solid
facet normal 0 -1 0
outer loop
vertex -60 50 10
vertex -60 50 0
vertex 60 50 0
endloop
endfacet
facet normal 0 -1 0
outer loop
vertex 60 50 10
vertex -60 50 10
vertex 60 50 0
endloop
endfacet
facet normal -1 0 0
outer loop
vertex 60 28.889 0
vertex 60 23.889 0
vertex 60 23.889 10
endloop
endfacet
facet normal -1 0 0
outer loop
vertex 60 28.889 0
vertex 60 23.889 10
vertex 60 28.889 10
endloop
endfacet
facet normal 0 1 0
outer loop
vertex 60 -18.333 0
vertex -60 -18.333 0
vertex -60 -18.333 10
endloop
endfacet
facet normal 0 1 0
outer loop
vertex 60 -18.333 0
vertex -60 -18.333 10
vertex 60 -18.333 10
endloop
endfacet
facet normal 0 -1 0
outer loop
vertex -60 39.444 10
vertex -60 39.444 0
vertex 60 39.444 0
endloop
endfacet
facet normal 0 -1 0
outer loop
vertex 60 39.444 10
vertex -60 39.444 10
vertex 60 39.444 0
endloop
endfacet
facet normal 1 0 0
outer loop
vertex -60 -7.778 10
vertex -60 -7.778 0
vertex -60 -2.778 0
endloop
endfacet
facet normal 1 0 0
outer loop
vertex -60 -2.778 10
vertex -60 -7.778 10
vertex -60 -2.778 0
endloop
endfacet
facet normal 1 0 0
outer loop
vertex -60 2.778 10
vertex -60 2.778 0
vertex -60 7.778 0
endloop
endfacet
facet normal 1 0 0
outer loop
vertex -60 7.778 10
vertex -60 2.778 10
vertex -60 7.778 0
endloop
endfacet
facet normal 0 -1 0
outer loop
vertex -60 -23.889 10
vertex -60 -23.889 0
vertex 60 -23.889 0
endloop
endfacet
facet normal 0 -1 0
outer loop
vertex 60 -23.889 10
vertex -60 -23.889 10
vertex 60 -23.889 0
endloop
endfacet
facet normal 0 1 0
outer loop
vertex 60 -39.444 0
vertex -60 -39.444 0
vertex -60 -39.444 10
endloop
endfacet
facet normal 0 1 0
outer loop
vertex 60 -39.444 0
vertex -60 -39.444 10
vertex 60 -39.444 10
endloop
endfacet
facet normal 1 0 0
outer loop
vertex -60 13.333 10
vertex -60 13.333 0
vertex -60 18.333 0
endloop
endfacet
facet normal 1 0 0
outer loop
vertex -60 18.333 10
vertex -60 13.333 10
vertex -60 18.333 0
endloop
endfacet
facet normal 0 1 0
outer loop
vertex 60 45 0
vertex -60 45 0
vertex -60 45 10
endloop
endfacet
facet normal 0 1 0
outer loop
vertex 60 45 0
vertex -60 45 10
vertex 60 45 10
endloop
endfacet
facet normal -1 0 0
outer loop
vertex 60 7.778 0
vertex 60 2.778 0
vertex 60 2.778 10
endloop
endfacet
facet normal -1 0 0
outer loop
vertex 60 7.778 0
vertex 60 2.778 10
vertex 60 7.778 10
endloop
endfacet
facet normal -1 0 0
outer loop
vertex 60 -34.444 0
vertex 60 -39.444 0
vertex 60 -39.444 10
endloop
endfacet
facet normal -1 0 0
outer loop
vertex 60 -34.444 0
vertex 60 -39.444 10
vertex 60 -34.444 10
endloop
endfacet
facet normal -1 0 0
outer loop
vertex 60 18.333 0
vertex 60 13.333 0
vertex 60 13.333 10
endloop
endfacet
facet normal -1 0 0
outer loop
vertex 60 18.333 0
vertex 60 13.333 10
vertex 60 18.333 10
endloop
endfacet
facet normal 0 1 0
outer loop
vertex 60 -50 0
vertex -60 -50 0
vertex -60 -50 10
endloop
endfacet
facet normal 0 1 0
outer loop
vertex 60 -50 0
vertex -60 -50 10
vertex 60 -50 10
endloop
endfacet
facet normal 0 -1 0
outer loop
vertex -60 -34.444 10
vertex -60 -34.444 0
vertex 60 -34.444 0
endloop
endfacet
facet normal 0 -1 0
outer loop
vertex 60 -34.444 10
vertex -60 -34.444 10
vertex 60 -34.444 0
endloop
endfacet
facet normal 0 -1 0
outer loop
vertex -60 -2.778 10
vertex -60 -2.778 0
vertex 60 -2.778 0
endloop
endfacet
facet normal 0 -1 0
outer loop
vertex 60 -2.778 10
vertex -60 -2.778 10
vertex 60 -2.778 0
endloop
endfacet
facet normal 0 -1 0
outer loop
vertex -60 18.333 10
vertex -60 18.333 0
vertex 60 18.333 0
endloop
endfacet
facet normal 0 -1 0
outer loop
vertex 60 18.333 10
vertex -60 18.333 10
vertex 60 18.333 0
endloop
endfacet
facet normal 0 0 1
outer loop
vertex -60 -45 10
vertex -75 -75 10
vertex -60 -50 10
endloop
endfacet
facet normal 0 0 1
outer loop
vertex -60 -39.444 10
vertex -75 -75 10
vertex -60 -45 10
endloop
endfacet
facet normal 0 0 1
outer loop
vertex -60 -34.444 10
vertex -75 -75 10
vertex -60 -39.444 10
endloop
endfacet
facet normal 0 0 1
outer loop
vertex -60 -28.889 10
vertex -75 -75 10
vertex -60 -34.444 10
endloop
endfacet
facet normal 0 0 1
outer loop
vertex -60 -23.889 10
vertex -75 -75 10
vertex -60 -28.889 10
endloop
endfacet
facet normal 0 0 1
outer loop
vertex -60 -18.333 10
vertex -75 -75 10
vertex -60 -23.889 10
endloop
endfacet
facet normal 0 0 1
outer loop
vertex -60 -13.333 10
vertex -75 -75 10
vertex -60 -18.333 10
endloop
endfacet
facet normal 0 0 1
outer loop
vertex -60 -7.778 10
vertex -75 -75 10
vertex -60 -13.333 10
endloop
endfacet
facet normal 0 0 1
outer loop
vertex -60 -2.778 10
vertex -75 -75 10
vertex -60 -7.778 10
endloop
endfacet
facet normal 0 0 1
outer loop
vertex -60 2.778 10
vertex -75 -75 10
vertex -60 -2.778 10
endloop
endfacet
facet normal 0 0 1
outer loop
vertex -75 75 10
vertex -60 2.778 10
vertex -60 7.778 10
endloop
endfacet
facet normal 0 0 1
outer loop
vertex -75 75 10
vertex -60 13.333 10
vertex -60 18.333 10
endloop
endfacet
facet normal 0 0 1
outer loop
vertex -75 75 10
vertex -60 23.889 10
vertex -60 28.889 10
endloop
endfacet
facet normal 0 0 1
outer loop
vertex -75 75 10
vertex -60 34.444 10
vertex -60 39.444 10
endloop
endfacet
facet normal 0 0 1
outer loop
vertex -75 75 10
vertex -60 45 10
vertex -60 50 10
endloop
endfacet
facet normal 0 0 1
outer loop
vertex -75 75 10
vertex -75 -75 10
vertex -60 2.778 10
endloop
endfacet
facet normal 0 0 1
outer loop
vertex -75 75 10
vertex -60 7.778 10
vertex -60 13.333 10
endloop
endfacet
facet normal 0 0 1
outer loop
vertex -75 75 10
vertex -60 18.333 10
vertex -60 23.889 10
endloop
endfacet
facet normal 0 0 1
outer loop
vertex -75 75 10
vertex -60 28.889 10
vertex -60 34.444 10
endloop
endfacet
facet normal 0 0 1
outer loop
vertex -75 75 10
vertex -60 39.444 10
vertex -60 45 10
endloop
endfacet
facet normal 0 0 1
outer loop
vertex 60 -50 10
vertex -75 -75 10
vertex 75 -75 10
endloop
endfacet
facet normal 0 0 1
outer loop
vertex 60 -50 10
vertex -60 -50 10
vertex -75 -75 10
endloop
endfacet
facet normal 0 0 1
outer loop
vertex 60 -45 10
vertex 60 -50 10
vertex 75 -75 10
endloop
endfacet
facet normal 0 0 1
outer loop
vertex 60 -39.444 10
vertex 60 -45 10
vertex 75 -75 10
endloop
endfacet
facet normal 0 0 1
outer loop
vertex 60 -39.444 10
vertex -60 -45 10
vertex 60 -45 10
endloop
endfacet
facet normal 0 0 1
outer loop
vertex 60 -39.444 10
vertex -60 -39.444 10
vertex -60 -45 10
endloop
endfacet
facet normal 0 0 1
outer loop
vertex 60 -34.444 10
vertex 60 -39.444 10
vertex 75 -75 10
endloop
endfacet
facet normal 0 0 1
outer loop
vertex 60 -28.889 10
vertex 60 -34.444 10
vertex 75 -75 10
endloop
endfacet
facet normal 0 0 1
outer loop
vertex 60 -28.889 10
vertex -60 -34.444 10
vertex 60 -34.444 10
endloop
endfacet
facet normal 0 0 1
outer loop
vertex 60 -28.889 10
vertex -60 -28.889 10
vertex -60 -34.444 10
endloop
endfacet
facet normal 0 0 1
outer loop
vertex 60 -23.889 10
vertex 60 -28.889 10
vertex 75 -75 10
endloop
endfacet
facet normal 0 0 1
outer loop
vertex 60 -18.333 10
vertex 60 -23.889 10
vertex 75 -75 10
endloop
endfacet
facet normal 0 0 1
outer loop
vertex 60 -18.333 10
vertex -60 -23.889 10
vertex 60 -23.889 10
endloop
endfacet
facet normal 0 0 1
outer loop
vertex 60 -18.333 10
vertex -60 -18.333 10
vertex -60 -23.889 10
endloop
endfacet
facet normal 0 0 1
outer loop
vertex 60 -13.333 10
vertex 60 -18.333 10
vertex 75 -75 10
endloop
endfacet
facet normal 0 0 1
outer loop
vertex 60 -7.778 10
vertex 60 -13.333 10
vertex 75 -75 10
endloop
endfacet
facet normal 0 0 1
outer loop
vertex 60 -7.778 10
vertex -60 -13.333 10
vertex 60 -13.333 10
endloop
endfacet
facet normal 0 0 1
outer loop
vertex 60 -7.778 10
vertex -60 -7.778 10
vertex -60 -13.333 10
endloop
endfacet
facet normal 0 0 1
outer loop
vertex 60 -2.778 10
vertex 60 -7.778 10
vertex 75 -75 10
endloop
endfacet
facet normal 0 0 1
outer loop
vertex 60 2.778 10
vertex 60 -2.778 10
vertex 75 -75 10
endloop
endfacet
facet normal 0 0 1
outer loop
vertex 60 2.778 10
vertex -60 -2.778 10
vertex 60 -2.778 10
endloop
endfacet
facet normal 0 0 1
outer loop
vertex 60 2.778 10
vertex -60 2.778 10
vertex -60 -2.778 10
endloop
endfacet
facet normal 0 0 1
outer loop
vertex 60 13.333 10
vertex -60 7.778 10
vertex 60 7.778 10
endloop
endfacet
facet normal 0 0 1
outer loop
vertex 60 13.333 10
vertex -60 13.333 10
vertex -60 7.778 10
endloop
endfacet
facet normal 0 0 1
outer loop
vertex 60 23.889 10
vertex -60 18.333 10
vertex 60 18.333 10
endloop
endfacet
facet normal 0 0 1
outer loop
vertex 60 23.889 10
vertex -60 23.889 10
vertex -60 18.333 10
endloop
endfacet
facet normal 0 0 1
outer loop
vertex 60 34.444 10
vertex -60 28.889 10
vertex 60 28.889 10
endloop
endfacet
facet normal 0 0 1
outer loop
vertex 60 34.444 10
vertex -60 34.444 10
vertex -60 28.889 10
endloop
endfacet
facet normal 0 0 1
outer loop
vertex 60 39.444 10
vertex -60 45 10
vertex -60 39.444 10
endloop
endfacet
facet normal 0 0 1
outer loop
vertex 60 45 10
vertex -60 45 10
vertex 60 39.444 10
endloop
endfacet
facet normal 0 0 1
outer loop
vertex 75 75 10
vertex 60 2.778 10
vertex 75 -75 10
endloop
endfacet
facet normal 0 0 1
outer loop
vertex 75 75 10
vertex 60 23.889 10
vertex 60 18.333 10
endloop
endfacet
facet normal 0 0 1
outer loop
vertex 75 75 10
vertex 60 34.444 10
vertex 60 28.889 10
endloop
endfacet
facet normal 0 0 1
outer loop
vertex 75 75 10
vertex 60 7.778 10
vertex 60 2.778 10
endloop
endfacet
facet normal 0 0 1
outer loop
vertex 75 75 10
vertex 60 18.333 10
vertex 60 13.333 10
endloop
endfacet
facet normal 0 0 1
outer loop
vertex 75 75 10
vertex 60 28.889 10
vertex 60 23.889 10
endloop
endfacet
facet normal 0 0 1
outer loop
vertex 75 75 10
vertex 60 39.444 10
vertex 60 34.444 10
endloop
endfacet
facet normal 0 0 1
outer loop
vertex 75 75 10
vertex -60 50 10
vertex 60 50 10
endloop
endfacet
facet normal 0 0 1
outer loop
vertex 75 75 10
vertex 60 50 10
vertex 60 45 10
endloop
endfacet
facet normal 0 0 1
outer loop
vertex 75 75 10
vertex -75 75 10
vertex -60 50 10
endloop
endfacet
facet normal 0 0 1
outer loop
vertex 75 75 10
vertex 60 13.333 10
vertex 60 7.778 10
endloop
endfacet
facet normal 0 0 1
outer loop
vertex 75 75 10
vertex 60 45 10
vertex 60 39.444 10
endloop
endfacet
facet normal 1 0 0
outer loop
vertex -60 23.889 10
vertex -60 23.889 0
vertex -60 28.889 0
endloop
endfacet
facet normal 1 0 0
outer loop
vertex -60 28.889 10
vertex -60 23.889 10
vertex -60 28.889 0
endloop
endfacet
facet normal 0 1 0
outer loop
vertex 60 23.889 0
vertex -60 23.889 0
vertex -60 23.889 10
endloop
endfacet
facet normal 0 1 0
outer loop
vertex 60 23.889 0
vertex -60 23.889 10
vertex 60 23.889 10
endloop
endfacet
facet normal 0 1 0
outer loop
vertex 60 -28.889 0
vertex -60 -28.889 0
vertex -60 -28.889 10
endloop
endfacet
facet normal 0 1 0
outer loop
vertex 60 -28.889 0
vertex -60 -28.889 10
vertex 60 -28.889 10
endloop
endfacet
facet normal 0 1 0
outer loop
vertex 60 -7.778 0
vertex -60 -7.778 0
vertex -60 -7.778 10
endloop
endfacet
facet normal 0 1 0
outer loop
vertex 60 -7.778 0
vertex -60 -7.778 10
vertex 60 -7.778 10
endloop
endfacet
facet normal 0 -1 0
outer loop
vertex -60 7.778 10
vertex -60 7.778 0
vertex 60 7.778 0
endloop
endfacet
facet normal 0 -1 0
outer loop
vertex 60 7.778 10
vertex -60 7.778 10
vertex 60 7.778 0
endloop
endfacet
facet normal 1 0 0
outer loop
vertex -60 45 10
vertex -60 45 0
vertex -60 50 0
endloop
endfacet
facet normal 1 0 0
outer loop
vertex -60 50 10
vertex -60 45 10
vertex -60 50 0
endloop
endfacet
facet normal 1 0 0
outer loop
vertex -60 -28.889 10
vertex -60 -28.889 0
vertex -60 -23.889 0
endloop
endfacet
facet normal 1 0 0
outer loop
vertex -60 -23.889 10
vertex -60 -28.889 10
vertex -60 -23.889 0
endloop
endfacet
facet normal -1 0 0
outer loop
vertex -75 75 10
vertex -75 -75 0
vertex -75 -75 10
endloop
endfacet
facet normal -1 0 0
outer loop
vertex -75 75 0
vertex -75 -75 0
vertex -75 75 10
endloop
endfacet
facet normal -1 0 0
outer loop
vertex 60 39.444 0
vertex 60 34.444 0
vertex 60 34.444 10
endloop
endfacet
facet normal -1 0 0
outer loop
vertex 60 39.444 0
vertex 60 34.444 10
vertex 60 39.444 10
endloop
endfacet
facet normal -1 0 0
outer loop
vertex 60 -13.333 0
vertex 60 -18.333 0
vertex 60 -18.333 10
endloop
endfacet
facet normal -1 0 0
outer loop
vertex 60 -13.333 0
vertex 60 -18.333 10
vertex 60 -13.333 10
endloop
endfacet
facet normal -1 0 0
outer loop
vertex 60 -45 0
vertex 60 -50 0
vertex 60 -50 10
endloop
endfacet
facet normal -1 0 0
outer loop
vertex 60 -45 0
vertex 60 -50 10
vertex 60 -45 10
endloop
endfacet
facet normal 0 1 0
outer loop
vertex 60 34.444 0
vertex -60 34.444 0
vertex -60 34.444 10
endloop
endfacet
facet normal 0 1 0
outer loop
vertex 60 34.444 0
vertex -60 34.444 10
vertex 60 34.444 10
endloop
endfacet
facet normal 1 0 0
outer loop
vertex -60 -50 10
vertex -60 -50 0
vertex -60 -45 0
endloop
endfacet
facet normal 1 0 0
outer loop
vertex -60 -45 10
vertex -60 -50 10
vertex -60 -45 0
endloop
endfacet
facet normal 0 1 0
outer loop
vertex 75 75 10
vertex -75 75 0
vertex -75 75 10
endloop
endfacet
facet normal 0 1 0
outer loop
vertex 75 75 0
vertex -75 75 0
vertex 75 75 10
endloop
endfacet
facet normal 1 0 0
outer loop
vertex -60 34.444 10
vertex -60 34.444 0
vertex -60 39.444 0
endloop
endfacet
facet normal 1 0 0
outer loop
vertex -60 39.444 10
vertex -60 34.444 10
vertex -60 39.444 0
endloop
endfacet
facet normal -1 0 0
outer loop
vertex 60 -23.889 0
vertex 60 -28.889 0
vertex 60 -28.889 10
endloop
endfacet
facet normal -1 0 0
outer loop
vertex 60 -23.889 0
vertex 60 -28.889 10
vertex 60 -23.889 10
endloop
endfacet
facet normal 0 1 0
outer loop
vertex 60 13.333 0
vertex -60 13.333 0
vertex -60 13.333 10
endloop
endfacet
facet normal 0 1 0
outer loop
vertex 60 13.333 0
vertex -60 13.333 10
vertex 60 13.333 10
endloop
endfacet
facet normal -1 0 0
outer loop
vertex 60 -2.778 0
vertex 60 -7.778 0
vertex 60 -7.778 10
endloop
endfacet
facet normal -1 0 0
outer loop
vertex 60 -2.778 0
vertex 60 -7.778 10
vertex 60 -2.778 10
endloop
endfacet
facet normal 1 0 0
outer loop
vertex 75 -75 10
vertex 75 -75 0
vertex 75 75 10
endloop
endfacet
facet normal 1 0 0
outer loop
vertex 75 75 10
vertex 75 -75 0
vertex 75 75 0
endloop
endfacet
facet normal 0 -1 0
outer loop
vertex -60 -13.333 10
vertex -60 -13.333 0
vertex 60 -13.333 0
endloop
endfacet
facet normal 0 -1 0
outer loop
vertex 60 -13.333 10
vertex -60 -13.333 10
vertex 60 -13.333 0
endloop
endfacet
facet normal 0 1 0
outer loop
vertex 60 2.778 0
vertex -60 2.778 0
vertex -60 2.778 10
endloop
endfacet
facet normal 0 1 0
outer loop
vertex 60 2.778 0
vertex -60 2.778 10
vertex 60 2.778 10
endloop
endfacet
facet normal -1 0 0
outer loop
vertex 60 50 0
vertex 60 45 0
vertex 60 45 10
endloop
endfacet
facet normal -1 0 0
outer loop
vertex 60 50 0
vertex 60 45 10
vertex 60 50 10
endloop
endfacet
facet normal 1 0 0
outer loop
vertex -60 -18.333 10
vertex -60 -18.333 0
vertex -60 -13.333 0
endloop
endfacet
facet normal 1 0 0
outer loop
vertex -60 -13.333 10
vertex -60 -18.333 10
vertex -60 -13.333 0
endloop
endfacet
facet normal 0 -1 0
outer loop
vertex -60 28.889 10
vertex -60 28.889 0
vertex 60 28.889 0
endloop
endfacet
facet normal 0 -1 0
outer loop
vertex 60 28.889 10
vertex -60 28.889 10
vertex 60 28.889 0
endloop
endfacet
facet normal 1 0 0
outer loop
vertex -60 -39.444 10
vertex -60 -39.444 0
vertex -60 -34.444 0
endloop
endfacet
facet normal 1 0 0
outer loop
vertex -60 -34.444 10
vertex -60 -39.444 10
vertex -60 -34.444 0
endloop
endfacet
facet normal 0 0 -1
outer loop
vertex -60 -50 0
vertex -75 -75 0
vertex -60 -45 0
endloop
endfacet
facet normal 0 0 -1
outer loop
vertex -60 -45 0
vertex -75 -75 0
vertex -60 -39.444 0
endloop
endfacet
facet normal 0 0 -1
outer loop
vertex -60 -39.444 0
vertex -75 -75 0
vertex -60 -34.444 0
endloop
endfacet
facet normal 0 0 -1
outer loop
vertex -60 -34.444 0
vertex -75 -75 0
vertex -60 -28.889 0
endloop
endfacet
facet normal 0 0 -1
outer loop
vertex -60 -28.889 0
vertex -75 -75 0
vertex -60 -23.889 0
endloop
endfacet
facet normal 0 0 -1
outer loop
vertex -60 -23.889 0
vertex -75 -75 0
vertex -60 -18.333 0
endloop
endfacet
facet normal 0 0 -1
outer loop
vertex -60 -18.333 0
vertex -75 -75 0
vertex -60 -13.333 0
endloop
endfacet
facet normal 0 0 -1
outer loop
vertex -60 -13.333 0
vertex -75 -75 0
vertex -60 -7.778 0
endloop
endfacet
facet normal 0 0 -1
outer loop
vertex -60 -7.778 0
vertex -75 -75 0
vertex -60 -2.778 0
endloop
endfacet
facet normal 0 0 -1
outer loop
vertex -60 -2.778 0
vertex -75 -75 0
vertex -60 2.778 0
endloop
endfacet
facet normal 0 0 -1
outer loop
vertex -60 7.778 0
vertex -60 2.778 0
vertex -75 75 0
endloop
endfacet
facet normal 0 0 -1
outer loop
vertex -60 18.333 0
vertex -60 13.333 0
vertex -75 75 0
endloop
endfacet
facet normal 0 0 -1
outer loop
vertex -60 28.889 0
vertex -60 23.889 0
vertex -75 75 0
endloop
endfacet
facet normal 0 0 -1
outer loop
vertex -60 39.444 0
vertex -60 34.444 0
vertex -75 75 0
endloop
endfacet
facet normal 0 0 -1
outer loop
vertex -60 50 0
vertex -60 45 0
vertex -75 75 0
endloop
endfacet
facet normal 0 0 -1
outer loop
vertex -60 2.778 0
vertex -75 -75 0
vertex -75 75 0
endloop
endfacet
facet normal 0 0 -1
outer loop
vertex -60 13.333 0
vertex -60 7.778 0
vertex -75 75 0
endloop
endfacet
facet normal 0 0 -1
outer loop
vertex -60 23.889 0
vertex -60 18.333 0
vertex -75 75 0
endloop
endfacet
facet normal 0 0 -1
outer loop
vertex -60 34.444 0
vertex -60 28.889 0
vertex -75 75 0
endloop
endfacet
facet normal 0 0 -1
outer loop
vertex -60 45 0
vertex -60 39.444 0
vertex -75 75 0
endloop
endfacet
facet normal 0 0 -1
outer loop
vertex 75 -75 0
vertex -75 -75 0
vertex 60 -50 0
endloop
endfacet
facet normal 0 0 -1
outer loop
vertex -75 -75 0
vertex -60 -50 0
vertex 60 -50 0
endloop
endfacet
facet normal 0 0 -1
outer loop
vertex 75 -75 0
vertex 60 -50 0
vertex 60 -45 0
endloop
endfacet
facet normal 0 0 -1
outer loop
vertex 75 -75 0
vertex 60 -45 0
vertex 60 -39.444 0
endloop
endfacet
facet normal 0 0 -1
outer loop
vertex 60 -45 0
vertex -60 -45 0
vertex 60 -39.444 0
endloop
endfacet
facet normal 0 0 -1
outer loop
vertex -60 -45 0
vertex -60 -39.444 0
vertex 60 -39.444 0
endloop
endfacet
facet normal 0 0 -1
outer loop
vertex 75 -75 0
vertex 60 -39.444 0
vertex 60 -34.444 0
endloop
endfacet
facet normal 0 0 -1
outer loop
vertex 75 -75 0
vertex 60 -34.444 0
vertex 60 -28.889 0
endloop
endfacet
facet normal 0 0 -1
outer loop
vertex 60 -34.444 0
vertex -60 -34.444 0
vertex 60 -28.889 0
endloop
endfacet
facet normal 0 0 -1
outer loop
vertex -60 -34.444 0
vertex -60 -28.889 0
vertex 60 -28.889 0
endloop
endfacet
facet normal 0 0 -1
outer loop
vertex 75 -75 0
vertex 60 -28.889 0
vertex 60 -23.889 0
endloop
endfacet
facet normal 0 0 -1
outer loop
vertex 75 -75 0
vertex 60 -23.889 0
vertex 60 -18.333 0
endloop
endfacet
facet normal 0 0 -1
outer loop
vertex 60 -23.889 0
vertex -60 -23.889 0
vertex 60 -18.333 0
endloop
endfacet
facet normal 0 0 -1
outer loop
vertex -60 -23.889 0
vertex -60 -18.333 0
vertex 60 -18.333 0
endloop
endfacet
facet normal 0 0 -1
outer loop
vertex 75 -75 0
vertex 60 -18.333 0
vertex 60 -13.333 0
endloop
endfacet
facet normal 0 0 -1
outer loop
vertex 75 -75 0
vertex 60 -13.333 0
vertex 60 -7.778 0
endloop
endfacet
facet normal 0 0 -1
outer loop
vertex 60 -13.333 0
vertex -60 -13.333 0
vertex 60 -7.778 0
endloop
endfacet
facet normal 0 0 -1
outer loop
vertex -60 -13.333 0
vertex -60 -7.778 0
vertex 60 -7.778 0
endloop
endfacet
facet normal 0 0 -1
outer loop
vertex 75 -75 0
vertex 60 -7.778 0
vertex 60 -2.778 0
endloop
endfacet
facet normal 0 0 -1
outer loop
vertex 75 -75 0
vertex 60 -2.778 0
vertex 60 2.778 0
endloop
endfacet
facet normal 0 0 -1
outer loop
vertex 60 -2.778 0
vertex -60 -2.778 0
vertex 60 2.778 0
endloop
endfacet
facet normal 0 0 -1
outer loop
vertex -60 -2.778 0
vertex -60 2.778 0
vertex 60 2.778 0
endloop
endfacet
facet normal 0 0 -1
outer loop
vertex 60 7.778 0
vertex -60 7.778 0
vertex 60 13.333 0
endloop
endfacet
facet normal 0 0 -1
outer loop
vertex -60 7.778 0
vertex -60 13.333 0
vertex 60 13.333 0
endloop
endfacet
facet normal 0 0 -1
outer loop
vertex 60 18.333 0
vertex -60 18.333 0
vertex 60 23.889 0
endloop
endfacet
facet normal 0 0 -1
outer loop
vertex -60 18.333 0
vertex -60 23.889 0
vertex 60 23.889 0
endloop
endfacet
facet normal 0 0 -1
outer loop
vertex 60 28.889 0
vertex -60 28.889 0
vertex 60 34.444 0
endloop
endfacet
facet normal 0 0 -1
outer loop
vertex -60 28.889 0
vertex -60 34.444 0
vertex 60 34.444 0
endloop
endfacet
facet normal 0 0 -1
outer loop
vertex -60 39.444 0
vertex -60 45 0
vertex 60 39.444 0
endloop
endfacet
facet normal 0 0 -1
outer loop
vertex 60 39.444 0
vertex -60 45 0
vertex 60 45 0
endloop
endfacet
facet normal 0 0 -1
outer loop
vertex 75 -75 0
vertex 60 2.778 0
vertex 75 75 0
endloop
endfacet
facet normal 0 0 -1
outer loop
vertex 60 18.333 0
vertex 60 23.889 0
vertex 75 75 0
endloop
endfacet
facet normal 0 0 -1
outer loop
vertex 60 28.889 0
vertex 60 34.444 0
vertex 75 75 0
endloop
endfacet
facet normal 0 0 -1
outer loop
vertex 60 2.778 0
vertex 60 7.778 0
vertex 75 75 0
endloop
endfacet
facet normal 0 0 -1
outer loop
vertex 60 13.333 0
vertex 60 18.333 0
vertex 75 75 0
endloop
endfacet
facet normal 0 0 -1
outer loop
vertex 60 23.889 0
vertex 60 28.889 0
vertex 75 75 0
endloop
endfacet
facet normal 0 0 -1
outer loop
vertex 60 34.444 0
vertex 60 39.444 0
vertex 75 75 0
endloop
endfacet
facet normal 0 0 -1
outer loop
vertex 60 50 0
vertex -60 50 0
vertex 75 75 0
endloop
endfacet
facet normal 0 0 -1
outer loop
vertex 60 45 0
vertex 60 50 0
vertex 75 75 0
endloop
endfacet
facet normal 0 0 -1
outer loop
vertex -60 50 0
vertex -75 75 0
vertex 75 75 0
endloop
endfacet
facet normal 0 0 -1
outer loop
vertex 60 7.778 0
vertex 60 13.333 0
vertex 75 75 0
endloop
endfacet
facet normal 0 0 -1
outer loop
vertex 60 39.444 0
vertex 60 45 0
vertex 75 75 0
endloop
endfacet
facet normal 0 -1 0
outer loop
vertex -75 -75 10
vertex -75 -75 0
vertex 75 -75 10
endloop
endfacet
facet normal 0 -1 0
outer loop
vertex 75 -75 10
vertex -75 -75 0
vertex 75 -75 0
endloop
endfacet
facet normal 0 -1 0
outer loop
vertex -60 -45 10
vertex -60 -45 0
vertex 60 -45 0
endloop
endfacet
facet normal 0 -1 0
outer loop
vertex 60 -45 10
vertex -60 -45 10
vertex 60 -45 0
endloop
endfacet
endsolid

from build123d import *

# Parameters (mm, degrees)
F0_W     = 150
F0_H     = 150
F0_W_2   = 120
F0_H_2   = 5
F1_DEPTH = 10


with BuildPart() as f1:
    # F0 (on Top) → F1 (new body)
    with BuildSketch(Plane.XY):
        Rectangle(F0_W, F0_H)
        with Locations((0, -47.5)):
            Rectangle(F0_W_2, F0_H_2, mode=Mode.SUBTRACT)
        with Locations((0, -36.944444)):
            Rectangle(F0_W_2, F0_H_2, mode=Mode.SUBTRACT)
        with Locations((0, -26.388889)):
            Rectangle(F0_W_2, F0_H_2, mode=Mode.SUBTRACT)
        with Locations((0, -15.833333)):
            Rectangle(F0_W_2, F0_H_2, mode=Mode.SUBTRACT)
        with Locations((0, -5.277778)):
            Rectangle(F0_W_2, F0_H_2, mode=Mode.SUBTRACT)
        with Locations((0, 5.277778)):
            Rectangle(F0_W_2, F0_H_2, mode=Mode.SUBTRACT)
        with Locations((0, 15.833333)):
            Rectangle(F0_W_2, F0_H_2, mode=Mode.SUBTRACT)
        with Locations((0, 26.388889)):
            Rectangle(F0_W_2, F0_H_2, mode=Mode.SUBTRACT)
        with Locations((0, 36.944444)):
            Rectangle(F0_W_2, F0_H_2, mode=Mode.SUBTRACT)
        with Locations((0, 47.5)):
            Rectangle(F0_W_2, F0_H_2, mode=Mode.SUBTRACT)
    extrude(amount=F1_DEPTH)


solid = f1.part
